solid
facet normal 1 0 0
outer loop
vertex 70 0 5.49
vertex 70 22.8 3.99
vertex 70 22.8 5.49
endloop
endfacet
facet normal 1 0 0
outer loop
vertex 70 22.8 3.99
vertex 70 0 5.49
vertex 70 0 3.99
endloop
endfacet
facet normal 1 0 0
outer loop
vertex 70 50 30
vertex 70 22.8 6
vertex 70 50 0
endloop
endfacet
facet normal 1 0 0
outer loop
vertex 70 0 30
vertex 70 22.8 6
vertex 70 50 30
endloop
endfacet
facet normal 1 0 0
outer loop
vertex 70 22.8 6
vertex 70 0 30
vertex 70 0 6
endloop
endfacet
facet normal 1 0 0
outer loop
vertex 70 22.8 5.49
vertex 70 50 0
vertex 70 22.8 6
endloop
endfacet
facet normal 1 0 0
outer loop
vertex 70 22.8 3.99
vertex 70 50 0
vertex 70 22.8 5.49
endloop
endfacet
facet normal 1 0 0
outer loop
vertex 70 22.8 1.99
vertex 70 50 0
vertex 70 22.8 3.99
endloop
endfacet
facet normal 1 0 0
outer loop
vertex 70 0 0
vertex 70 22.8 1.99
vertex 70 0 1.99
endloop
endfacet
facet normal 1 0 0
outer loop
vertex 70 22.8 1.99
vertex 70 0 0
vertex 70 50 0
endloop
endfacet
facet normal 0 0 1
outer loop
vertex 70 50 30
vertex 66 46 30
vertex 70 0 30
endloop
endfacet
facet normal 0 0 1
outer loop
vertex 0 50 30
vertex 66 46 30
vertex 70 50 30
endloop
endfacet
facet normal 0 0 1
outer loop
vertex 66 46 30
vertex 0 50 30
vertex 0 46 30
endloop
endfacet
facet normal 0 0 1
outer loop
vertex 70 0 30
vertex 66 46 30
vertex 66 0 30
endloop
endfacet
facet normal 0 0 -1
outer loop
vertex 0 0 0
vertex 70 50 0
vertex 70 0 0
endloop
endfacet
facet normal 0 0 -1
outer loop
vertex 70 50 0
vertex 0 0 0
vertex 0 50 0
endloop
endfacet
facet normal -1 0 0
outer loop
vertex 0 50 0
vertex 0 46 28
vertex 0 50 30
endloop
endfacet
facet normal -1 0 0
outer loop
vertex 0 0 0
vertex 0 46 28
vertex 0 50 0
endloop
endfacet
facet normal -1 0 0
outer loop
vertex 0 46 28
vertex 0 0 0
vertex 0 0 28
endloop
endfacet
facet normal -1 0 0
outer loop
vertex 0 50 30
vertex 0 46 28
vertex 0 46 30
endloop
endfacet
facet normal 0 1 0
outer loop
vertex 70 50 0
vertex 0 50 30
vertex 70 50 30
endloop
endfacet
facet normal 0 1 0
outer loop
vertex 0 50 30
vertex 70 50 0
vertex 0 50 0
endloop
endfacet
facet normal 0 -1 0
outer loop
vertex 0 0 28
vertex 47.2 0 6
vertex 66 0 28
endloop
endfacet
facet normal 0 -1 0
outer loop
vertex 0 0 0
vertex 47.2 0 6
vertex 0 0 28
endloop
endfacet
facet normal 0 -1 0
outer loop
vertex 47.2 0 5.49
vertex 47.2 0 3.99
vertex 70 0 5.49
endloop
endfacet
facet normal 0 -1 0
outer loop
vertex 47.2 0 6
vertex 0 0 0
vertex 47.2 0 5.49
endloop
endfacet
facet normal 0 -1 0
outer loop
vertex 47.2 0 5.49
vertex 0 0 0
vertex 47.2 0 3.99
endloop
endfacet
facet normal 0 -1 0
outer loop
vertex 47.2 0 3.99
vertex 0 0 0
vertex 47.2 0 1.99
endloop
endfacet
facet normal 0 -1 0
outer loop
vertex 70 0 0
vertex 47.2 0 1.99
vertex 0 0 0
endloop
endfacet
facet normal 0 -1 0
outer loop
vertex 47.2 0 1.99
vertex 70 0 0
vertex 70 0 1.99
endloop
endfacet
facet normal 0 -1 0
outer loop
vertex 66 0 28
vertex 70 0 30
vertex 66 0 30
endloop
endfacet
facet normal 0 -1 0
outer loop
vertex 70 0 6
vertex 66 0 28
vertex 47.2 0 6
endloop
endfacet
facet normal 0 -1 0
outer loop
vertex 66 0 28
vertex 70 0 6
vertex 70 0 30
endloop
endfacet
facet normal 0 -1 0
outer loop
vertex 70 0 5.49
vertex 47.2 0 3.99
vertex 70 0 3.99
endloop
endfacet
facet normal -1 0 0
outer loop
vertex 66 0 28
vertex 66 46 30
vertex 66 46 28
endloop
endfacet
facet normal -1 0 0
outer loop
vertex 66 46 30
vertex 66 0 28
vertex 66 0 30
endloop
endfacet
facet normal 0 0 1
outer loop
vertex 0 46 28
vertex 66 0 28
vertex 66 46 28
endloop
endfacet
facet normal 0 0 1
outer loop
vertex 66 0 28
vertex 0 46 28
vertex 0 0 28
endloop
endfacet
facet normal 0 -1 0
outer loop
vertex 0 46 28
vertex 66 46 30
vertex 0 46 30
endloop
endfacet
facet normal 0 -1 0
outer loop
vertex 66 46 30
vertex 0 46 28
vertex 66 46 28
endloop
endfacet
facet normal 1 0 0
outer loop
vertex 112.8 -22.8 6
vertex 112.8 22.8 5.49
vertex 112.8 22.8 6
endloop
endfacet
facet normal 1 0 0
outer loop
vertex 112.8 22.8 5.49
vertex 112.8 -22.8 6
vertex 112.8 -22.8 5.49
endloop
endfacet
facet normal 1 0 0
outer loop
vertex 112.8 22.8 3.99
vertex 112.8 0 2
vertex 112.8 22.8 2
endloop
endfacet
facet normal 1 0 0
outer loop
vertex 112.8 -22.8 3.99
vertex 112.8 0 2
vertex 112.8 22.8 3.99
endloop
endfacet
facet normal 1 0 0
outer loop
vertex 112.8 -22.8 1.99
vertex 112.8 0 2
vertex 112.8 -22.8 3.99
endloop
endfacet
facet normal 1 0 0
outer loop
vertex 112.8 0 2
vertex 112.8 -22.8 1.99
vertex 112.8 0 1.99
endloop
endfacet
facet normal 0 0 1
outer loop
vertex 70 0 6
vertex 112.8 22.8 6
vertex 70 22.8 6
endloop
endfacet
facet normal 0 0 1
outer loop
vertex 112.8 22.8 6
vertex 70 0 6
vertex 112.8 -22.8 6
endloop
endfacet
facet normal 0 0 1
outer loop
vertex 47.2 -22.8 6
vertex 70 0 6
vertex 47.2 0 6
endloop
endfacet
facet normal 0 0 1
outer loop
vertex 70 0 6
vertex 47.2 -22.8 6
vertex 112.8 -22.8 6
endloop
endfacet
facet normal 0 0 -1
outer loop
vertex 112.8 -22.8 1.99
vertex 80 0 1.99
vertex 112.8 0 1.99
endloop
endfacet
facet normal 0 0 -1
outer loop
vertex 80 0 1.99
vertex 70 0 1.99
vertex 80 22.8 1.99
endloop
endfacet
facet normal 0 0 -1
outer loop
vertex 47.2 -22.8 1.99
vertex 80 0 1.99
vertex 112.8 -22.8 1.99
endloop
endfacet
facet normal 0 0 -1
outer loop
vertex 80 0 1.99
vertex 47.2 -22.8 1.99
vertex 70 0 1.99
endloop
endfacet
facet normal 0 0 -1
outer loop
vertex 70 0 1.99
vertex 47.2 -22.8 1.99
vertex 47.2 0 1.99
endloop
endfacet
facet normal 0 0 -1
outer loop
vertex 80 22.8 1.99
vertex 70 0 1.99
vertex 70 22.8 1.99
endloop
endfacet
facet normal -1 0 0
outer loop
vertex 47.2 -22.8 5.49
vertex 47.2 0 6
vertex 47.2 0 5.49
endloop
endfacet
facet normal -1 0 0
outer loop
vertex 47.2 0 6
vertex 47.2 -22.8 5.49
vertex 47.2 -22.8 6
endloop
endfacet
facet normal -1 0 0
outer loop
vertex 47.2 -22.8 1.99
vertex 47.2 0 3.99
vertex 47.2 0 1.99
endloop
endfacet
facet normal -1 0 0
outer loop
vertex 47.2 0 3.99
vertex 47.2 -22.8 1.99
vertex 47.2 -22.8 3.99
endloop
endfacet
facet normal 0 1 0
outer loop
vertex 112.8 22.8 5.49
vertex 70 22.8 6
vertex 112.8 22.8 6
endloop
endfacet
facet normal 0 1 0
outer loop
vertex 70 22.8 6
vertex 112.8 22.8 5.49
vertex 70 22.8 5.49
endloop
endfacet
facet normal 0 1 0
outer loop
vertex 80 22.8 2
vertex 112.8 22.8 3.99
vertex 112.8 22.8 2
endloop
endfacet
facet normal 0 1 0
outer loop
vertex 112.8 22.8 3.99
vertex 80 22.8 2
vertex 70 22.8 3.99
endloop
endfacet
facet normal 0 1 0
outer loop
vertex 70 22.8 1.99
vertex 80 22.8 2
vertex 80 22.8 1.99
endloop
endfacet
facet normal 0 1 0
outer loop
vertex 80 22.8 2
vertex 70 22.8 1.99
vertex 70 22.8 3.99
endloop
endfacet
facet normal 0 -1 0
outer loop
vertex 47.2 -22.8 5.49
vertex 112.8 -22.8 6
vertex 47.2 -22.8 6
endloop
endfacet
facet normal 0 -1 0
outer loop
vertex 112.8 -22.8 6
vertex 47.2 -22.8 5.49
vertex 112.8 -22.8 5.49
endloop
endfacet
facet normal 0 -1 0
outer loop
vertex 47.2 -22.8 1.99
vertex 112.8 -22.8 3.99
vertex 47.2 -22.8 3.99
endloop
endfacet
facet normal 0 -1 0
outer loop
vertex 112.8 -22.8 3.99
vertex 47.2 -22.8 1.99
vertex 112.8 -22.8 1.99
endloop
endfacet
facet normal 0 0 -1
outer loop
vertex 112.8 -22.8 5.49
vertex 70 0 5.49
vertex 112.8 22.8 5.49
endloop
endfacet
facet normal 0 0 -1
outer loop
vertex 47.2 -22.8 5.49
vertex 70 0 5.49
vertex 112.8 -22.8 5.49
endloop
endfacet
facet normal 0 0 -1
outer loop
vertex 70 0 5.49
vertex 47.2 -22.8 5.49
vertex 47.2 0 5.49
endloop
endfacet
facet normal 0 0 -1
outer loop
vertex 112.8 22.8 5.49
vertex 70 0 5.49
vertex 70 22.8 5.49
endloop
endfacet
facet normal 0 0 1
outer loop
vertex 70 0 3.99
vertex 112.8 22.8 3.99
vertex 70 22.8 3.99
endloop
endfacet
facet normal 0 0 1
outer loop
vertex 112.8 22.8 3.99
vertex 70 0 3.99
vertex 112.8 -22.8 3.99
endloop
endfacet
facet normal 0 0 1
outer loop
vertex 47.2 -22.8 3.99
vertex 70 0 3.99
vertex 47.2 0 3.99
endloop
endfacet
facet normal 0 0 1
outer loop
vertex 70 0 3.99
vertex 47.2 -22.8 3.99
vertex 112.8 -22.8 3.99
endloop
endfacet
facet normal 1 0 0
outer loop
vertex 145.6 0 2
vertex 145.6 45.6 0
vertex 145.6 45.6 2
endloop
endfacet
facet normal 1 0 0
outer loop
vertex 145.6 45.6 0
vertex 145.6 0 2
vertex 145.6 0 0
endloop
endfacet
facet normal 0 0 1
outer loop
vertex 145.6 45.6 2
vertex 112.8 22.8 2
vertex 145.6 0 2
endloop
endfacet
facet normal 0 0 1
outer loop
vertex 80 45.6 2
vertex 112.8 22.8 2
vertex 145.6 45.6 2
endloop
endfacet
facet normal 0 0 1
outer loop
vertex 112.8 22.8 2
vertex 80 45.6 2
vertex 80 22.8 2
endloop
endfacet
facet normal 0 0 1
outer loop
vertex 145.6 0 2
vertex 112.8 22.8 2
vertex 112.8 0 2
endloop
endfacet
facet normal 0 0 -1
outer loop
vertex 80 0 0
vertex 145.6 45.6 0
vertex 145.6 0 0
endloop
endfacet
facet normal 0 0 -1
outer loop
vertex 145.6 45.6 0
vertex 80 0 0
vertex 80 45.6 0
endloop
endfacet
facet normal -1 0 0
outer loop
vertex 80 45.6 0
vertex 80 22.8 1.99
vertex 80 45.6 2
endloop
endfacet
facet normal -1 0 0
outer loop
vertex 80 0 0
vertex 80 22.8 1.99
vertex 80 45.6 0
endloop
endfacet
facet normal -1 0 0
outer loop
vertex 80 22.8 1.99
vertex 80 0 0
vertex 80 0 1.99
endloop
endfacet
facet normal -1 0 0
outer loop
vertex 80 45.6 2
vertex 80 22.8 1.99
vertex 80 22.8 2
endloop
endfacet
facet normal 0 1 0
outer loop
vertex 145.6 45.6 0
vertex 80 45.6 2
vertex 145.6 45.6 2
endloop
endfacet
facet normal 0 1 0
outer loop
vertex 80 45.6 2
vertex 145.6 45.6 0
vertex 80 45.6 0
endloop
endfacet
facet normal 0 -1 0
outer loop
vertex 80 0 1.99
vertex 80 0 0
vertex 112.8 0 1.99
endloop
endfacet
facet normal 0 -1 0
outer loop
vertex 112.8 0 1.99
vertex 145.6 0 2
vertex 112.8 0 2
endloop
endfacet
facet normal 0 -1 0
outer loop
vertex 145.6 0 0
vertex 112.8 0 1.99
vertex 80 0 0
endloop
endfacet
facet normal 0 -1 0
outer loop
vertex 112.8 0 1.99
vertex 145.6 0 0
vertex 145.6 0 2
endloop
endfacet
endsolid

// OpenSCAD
// Two-part enclosure for a small electronics board (e.g., Arduino-based logger)
// Print orientation: box standing on the bed, lid flat on the bed to its right

// ---------------- Parameters ----------------
box_x      = 70;    // box outer size in X (mm)
box_y      = 50;    // box outer size in Y (mm)
box_z      = 30;    // box outer size in Z (mm)
box_wall   = 2;     // box wall thickness (mm)
box_floor  = 2;     // box floor thickness (mm)

lip_x      = 65.6;  // lip outer size in X (mm)
lip_y      = 45.6;  // lip outer size in Y (mm)
lip_t      = 1.5;   // lip wall thickness (mm)
lip_h      = 4;     // lip height above plate (mm)

gap        = 10;    // gap between box and lid (mm)

eps        = 0.5;   // cutter overshoot past faces (mm)

$fn = 64;

// Derived dimensions
box_inner_x = box_x - 2*box_wall;   // 66
box_inner_y = box_y - 2*box_wall;   // 46
plate_t     = 2;                    // lid plate thickness (mm)

// ---------------- Model ----------------
union() {
    // Part 1: Box, open top
    difference() {
        cube([box_x, box_y, box_z]);
        translate([0, 0, box_z - box_wall])
            cube([box_inner_x, box_inner_y, box_wall + eps]);
    }

    // Part 2: Lid plate with sliding lip, printed upside down
    union() {
        // Base plate
        translate([box_x + gap, 0, 0])
            cube([lip_x, lip_y, plate_t]);

        // Lip: solid block whose top face is the ceiling;
        // the hollowed interior overlaps the plate slightly for a clean union.
        translate([box_x + gap - lip_x/2, -lip_y/2,
                   plate_t - 0.01])
            difference() {
                cube([lip_x, lip_y, lip_h + 0.01]);
                translate([0, 0, plate_t])
                    cube([lip_x, lip_y, lip_t]);
            }
    }
}
